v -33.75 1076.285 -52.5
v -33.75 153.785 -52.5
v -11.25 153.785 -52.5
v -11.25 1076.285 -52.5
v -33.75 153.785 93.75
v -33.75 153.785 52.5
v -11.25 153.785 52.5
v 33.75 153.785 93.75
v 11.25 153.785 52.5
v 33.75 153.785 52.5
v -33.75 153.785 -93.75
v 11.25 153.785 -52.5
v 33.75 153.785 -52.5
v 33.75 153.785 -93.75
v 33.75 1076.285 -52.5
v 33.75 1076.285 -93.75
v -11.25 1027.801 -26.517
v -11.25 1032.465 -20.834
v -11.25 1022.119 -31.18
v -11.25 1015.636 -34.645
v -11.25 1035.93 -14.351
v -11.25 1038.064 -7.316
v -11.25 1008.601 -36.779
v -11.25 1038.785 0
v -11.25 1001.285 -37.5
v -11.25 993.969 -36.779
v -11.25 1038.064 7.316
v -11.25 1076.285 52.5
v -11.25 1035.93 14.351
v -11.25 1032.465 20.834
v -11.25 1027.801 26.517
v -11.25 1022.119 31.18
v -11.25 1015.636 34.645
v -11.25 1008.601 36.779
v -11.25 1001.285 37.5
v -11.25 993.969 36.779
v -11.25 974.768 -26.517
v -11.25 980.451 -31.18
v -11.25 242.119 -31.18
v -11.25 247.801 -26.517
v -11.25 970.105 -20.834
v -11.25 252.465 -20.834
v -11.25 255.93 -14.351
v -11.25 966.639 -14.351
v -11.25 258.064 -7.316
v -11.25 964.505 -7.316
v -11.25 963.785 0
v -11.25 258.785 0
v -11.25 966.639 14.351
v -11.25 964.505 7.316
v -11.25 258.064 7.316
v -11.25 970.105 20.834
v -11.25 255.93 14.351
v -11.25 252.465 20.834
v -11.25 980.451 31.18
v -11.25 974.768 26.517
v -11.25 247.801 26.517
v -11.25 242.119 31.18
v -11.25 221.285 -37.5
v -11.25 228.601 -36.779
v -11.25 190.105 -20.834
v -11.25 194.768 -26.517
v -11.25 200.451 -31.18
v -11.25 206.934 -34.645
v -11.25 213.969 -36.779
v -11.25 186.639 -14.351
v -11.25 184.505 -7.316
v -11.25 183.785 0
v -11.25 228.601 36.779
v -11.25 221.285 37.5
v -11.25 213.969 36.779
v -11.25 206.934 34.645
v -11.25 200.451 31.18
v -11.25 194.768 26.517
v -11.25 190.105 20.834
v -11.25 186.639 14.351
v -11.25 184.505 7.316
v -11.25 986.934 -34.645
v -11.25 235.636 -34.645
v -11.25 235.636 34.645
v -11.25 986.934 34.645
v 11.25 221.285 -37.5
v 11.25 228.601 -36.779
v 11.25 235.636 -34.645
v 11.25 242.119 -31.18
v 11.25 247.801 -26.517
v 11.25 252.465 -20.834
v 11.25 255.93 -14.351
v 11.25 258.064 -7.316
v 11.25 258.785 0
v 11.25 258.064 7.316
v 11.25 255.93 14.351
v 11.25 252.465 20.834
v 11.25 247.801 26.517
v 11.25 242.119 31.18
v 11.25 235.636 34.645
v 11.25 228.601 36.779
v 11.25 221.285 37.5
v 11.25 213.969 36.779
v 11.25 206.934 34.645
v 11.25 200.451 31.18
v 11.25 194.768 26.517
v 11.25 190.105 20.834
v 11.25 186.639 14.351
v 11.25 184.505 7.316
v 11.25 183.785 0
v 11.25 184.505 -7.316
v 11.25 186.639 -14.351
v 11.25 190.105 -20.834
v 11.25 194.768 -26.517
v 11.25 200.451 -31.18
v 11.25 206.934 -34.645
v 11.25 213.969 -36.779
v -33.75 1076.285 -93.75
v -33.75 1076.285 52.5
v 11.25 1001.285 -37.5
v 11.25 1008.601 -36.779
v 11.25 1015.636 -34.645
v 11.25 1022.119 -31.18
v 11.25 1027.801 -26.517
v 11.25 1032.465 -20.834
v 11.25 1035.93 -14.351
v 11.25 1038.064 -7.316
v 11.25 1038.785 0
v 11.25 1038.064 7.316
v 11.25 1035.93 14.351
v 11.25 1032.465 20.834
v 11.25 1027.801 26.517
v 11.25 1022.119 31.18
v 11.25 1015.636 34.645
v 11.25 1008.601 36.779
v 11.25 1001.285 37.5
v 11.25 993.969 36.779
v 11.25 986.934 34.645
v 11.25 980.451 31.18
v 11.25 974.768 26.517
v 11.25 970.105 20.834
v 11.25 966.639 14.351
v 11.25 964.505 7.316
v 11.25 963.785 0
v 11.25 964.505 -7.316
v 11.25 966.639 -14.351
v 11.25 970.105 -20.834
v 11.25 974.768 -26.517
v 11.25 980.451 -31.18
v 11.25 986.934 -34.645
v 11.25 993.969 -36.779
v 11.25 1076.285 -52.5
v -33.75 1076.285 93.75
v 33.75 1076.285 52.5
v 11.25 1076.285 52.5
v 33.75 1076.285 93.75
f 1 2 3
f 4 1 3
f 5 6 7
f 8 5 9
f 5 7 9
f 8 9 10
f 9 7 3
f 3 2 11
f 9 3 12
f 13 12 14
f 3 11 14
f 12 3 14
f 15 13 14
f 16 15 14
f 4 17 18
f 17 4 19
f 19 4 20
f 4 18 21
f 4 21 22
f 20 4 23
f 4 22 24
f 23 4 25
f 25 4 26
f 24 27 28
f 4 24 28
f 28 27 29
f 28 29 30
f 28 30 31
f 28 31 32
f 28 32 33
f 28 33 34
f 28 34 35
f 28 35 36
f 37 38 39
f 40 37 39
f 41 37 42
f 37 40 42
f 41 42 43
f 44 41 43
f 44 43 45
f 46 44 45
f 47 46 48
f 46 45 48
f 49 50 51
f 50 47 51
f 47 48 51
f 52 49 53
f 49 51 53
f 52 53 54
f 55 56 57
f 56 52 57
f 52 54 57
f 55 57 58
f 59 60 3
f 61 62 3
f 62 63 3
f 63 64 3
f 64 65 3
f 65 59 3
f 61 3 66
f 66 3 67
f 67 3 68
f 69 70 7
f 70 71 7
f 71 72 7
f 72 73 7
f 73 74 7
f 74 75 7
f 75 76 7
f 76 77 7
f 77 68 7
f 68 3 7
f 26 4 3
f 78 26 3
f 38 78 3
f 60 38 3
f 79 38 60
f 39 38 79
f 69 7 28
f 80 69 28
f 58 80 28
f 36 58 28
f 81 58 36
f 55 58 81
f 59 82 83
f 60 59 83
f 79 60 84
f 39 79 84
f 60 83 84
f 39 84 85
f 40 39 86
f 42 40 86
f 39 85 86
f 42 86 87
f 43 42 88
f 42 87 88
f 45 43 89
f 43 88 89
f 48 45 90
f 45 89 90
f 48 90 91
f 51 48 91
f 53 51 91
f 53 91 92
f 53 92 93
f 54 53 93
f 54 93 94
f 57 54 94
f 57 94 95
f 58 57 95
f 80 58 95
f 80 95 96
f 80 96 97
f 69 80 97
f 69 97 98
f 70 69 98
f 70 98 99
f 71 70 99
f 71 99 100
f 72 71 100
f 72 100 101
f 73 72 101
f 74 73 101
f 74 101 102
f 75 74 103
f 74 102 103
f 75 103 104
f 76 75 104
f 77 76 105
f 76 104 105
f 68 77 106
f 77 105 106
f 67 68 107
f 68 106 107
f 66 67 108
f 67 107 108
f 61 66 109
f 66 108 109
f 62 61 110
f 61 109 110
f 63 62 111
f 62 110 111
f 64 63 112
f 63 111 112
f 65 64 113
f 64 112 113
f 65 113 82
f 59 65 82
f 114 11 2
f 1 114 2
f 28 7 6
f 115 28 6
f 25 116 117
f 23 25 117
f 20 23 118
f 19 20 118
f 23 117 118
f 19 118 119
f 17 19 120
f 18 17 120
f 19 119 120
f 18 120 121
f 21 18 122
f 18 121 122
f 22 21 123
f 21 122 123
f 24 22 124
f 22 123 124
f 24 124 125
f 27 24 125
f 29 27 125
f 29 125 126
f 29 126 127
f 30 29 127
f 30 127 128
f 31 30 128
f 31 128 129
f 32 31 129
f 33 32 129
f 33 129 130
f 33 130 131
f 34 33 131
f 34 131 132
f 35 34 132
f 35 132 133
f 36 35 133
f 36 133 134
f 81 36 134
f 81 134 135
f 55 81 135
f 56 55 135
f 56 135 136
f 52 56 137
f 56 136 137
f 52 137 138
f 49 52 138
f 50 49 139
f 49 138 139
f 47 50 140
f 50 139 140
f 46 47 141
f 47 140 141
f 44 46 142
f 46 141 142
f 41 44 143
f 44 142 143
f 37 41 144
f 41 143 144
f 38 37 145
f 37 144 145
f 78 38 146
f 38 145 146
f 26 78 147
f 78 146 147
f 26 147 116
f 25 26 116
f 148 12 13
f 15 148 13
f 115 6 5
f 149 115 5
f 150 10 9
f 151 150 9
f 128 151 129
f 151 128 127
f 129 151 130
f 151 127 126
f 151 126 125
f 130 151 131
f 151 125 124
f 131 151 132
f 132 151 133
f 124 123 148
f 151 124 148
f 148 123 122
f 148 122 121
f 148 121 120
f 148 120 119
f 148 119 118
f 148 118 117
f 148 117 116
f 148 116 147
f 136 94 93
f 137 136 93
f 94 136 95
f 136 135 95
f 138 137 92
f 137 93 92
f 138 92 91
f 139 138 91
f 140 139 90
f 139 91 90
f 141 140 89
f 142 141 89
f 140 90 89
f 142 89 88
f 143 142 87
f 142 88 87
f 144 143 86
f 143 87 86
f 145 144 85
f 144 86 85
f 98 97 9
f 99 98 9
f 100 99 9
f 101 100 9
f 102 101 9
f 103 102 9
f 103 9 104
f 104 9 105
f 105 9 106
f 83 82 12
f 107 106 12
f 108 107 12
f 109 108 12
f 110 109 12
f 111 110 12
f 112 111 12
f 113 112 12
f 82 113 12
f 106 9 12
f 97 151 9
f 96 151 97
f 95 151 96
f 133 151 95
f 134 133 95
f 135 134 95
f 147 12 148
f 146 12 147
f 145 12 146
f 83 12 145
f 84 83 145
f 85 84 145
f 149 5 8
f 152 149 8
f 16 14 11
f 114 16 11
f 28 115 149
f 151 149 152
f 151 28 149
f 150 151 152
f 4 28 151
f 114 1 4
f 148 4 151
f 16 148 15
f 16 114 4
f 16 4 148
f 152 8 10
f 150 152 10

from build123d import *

# Parameters (mm, degrees)
BOSS_EXTRUDE1_DEPTH = 1230
SKETCH2_R           = 50
CUT_EXTRUDE1_DEPTH  = 1200
SKETCH3_R           = 50
CUT_EXTRUDE2_DEPTH  = 1200
SCALE1_SCALE        = 0.75


with BuildPart() as part:
    # Sketch1 → Boss-Extrude1 (new body)
    with BuildSketch(Plane(origin=(0, 0, 0), x_dir=(1, 0, 0), z_dir=(0, 1, 0))):
        Polygon((-45, -70), (-45, -125), (45, -125), (45, -70), (15, -70), (15, 70), (45, 70), (45, 125), (-45, 125), (-45, 70), (-15, 70), (-15, -70), align=None)
    extrude(amount=BOSS_EXTRUDE1_DEPTH)

    # Sketch2 → Cut-Extrude1 (cut)
    with BuildSketch(Plane(origin=(15, 0, 0), x_dir=(0, 0, -1), z_dir=(1, 0, 0))):
        with Locations((0, 90)):
            Circle(SKETCH2_R)
    extrude(amount=-CUT_EXTRUDE1_DEPTH, mode=Mode.SUBTRACT)

    # Sketch3 → Cut-Extrude2 (cut)
    with BuildSketch(Plane(origin=(15, 0, 0), x_dir=(0, 0, -1), z_dir=(1, 0, 0))):
        with Locations((0, 1130)):
            Circle(SKETCH3_R)
    extrude(amount=-CUT_EXTRUDE2_DEPTH, mode=Mode.SUBTRACT)


with BuildPart() as part_1:
    # Scale1: scaled about (0, 615.139653144, 0)
    add(part.part.scale(SCALE1_SCALE).moved(Location((0, 153.784913286, 0))))


solid = part_1.part
